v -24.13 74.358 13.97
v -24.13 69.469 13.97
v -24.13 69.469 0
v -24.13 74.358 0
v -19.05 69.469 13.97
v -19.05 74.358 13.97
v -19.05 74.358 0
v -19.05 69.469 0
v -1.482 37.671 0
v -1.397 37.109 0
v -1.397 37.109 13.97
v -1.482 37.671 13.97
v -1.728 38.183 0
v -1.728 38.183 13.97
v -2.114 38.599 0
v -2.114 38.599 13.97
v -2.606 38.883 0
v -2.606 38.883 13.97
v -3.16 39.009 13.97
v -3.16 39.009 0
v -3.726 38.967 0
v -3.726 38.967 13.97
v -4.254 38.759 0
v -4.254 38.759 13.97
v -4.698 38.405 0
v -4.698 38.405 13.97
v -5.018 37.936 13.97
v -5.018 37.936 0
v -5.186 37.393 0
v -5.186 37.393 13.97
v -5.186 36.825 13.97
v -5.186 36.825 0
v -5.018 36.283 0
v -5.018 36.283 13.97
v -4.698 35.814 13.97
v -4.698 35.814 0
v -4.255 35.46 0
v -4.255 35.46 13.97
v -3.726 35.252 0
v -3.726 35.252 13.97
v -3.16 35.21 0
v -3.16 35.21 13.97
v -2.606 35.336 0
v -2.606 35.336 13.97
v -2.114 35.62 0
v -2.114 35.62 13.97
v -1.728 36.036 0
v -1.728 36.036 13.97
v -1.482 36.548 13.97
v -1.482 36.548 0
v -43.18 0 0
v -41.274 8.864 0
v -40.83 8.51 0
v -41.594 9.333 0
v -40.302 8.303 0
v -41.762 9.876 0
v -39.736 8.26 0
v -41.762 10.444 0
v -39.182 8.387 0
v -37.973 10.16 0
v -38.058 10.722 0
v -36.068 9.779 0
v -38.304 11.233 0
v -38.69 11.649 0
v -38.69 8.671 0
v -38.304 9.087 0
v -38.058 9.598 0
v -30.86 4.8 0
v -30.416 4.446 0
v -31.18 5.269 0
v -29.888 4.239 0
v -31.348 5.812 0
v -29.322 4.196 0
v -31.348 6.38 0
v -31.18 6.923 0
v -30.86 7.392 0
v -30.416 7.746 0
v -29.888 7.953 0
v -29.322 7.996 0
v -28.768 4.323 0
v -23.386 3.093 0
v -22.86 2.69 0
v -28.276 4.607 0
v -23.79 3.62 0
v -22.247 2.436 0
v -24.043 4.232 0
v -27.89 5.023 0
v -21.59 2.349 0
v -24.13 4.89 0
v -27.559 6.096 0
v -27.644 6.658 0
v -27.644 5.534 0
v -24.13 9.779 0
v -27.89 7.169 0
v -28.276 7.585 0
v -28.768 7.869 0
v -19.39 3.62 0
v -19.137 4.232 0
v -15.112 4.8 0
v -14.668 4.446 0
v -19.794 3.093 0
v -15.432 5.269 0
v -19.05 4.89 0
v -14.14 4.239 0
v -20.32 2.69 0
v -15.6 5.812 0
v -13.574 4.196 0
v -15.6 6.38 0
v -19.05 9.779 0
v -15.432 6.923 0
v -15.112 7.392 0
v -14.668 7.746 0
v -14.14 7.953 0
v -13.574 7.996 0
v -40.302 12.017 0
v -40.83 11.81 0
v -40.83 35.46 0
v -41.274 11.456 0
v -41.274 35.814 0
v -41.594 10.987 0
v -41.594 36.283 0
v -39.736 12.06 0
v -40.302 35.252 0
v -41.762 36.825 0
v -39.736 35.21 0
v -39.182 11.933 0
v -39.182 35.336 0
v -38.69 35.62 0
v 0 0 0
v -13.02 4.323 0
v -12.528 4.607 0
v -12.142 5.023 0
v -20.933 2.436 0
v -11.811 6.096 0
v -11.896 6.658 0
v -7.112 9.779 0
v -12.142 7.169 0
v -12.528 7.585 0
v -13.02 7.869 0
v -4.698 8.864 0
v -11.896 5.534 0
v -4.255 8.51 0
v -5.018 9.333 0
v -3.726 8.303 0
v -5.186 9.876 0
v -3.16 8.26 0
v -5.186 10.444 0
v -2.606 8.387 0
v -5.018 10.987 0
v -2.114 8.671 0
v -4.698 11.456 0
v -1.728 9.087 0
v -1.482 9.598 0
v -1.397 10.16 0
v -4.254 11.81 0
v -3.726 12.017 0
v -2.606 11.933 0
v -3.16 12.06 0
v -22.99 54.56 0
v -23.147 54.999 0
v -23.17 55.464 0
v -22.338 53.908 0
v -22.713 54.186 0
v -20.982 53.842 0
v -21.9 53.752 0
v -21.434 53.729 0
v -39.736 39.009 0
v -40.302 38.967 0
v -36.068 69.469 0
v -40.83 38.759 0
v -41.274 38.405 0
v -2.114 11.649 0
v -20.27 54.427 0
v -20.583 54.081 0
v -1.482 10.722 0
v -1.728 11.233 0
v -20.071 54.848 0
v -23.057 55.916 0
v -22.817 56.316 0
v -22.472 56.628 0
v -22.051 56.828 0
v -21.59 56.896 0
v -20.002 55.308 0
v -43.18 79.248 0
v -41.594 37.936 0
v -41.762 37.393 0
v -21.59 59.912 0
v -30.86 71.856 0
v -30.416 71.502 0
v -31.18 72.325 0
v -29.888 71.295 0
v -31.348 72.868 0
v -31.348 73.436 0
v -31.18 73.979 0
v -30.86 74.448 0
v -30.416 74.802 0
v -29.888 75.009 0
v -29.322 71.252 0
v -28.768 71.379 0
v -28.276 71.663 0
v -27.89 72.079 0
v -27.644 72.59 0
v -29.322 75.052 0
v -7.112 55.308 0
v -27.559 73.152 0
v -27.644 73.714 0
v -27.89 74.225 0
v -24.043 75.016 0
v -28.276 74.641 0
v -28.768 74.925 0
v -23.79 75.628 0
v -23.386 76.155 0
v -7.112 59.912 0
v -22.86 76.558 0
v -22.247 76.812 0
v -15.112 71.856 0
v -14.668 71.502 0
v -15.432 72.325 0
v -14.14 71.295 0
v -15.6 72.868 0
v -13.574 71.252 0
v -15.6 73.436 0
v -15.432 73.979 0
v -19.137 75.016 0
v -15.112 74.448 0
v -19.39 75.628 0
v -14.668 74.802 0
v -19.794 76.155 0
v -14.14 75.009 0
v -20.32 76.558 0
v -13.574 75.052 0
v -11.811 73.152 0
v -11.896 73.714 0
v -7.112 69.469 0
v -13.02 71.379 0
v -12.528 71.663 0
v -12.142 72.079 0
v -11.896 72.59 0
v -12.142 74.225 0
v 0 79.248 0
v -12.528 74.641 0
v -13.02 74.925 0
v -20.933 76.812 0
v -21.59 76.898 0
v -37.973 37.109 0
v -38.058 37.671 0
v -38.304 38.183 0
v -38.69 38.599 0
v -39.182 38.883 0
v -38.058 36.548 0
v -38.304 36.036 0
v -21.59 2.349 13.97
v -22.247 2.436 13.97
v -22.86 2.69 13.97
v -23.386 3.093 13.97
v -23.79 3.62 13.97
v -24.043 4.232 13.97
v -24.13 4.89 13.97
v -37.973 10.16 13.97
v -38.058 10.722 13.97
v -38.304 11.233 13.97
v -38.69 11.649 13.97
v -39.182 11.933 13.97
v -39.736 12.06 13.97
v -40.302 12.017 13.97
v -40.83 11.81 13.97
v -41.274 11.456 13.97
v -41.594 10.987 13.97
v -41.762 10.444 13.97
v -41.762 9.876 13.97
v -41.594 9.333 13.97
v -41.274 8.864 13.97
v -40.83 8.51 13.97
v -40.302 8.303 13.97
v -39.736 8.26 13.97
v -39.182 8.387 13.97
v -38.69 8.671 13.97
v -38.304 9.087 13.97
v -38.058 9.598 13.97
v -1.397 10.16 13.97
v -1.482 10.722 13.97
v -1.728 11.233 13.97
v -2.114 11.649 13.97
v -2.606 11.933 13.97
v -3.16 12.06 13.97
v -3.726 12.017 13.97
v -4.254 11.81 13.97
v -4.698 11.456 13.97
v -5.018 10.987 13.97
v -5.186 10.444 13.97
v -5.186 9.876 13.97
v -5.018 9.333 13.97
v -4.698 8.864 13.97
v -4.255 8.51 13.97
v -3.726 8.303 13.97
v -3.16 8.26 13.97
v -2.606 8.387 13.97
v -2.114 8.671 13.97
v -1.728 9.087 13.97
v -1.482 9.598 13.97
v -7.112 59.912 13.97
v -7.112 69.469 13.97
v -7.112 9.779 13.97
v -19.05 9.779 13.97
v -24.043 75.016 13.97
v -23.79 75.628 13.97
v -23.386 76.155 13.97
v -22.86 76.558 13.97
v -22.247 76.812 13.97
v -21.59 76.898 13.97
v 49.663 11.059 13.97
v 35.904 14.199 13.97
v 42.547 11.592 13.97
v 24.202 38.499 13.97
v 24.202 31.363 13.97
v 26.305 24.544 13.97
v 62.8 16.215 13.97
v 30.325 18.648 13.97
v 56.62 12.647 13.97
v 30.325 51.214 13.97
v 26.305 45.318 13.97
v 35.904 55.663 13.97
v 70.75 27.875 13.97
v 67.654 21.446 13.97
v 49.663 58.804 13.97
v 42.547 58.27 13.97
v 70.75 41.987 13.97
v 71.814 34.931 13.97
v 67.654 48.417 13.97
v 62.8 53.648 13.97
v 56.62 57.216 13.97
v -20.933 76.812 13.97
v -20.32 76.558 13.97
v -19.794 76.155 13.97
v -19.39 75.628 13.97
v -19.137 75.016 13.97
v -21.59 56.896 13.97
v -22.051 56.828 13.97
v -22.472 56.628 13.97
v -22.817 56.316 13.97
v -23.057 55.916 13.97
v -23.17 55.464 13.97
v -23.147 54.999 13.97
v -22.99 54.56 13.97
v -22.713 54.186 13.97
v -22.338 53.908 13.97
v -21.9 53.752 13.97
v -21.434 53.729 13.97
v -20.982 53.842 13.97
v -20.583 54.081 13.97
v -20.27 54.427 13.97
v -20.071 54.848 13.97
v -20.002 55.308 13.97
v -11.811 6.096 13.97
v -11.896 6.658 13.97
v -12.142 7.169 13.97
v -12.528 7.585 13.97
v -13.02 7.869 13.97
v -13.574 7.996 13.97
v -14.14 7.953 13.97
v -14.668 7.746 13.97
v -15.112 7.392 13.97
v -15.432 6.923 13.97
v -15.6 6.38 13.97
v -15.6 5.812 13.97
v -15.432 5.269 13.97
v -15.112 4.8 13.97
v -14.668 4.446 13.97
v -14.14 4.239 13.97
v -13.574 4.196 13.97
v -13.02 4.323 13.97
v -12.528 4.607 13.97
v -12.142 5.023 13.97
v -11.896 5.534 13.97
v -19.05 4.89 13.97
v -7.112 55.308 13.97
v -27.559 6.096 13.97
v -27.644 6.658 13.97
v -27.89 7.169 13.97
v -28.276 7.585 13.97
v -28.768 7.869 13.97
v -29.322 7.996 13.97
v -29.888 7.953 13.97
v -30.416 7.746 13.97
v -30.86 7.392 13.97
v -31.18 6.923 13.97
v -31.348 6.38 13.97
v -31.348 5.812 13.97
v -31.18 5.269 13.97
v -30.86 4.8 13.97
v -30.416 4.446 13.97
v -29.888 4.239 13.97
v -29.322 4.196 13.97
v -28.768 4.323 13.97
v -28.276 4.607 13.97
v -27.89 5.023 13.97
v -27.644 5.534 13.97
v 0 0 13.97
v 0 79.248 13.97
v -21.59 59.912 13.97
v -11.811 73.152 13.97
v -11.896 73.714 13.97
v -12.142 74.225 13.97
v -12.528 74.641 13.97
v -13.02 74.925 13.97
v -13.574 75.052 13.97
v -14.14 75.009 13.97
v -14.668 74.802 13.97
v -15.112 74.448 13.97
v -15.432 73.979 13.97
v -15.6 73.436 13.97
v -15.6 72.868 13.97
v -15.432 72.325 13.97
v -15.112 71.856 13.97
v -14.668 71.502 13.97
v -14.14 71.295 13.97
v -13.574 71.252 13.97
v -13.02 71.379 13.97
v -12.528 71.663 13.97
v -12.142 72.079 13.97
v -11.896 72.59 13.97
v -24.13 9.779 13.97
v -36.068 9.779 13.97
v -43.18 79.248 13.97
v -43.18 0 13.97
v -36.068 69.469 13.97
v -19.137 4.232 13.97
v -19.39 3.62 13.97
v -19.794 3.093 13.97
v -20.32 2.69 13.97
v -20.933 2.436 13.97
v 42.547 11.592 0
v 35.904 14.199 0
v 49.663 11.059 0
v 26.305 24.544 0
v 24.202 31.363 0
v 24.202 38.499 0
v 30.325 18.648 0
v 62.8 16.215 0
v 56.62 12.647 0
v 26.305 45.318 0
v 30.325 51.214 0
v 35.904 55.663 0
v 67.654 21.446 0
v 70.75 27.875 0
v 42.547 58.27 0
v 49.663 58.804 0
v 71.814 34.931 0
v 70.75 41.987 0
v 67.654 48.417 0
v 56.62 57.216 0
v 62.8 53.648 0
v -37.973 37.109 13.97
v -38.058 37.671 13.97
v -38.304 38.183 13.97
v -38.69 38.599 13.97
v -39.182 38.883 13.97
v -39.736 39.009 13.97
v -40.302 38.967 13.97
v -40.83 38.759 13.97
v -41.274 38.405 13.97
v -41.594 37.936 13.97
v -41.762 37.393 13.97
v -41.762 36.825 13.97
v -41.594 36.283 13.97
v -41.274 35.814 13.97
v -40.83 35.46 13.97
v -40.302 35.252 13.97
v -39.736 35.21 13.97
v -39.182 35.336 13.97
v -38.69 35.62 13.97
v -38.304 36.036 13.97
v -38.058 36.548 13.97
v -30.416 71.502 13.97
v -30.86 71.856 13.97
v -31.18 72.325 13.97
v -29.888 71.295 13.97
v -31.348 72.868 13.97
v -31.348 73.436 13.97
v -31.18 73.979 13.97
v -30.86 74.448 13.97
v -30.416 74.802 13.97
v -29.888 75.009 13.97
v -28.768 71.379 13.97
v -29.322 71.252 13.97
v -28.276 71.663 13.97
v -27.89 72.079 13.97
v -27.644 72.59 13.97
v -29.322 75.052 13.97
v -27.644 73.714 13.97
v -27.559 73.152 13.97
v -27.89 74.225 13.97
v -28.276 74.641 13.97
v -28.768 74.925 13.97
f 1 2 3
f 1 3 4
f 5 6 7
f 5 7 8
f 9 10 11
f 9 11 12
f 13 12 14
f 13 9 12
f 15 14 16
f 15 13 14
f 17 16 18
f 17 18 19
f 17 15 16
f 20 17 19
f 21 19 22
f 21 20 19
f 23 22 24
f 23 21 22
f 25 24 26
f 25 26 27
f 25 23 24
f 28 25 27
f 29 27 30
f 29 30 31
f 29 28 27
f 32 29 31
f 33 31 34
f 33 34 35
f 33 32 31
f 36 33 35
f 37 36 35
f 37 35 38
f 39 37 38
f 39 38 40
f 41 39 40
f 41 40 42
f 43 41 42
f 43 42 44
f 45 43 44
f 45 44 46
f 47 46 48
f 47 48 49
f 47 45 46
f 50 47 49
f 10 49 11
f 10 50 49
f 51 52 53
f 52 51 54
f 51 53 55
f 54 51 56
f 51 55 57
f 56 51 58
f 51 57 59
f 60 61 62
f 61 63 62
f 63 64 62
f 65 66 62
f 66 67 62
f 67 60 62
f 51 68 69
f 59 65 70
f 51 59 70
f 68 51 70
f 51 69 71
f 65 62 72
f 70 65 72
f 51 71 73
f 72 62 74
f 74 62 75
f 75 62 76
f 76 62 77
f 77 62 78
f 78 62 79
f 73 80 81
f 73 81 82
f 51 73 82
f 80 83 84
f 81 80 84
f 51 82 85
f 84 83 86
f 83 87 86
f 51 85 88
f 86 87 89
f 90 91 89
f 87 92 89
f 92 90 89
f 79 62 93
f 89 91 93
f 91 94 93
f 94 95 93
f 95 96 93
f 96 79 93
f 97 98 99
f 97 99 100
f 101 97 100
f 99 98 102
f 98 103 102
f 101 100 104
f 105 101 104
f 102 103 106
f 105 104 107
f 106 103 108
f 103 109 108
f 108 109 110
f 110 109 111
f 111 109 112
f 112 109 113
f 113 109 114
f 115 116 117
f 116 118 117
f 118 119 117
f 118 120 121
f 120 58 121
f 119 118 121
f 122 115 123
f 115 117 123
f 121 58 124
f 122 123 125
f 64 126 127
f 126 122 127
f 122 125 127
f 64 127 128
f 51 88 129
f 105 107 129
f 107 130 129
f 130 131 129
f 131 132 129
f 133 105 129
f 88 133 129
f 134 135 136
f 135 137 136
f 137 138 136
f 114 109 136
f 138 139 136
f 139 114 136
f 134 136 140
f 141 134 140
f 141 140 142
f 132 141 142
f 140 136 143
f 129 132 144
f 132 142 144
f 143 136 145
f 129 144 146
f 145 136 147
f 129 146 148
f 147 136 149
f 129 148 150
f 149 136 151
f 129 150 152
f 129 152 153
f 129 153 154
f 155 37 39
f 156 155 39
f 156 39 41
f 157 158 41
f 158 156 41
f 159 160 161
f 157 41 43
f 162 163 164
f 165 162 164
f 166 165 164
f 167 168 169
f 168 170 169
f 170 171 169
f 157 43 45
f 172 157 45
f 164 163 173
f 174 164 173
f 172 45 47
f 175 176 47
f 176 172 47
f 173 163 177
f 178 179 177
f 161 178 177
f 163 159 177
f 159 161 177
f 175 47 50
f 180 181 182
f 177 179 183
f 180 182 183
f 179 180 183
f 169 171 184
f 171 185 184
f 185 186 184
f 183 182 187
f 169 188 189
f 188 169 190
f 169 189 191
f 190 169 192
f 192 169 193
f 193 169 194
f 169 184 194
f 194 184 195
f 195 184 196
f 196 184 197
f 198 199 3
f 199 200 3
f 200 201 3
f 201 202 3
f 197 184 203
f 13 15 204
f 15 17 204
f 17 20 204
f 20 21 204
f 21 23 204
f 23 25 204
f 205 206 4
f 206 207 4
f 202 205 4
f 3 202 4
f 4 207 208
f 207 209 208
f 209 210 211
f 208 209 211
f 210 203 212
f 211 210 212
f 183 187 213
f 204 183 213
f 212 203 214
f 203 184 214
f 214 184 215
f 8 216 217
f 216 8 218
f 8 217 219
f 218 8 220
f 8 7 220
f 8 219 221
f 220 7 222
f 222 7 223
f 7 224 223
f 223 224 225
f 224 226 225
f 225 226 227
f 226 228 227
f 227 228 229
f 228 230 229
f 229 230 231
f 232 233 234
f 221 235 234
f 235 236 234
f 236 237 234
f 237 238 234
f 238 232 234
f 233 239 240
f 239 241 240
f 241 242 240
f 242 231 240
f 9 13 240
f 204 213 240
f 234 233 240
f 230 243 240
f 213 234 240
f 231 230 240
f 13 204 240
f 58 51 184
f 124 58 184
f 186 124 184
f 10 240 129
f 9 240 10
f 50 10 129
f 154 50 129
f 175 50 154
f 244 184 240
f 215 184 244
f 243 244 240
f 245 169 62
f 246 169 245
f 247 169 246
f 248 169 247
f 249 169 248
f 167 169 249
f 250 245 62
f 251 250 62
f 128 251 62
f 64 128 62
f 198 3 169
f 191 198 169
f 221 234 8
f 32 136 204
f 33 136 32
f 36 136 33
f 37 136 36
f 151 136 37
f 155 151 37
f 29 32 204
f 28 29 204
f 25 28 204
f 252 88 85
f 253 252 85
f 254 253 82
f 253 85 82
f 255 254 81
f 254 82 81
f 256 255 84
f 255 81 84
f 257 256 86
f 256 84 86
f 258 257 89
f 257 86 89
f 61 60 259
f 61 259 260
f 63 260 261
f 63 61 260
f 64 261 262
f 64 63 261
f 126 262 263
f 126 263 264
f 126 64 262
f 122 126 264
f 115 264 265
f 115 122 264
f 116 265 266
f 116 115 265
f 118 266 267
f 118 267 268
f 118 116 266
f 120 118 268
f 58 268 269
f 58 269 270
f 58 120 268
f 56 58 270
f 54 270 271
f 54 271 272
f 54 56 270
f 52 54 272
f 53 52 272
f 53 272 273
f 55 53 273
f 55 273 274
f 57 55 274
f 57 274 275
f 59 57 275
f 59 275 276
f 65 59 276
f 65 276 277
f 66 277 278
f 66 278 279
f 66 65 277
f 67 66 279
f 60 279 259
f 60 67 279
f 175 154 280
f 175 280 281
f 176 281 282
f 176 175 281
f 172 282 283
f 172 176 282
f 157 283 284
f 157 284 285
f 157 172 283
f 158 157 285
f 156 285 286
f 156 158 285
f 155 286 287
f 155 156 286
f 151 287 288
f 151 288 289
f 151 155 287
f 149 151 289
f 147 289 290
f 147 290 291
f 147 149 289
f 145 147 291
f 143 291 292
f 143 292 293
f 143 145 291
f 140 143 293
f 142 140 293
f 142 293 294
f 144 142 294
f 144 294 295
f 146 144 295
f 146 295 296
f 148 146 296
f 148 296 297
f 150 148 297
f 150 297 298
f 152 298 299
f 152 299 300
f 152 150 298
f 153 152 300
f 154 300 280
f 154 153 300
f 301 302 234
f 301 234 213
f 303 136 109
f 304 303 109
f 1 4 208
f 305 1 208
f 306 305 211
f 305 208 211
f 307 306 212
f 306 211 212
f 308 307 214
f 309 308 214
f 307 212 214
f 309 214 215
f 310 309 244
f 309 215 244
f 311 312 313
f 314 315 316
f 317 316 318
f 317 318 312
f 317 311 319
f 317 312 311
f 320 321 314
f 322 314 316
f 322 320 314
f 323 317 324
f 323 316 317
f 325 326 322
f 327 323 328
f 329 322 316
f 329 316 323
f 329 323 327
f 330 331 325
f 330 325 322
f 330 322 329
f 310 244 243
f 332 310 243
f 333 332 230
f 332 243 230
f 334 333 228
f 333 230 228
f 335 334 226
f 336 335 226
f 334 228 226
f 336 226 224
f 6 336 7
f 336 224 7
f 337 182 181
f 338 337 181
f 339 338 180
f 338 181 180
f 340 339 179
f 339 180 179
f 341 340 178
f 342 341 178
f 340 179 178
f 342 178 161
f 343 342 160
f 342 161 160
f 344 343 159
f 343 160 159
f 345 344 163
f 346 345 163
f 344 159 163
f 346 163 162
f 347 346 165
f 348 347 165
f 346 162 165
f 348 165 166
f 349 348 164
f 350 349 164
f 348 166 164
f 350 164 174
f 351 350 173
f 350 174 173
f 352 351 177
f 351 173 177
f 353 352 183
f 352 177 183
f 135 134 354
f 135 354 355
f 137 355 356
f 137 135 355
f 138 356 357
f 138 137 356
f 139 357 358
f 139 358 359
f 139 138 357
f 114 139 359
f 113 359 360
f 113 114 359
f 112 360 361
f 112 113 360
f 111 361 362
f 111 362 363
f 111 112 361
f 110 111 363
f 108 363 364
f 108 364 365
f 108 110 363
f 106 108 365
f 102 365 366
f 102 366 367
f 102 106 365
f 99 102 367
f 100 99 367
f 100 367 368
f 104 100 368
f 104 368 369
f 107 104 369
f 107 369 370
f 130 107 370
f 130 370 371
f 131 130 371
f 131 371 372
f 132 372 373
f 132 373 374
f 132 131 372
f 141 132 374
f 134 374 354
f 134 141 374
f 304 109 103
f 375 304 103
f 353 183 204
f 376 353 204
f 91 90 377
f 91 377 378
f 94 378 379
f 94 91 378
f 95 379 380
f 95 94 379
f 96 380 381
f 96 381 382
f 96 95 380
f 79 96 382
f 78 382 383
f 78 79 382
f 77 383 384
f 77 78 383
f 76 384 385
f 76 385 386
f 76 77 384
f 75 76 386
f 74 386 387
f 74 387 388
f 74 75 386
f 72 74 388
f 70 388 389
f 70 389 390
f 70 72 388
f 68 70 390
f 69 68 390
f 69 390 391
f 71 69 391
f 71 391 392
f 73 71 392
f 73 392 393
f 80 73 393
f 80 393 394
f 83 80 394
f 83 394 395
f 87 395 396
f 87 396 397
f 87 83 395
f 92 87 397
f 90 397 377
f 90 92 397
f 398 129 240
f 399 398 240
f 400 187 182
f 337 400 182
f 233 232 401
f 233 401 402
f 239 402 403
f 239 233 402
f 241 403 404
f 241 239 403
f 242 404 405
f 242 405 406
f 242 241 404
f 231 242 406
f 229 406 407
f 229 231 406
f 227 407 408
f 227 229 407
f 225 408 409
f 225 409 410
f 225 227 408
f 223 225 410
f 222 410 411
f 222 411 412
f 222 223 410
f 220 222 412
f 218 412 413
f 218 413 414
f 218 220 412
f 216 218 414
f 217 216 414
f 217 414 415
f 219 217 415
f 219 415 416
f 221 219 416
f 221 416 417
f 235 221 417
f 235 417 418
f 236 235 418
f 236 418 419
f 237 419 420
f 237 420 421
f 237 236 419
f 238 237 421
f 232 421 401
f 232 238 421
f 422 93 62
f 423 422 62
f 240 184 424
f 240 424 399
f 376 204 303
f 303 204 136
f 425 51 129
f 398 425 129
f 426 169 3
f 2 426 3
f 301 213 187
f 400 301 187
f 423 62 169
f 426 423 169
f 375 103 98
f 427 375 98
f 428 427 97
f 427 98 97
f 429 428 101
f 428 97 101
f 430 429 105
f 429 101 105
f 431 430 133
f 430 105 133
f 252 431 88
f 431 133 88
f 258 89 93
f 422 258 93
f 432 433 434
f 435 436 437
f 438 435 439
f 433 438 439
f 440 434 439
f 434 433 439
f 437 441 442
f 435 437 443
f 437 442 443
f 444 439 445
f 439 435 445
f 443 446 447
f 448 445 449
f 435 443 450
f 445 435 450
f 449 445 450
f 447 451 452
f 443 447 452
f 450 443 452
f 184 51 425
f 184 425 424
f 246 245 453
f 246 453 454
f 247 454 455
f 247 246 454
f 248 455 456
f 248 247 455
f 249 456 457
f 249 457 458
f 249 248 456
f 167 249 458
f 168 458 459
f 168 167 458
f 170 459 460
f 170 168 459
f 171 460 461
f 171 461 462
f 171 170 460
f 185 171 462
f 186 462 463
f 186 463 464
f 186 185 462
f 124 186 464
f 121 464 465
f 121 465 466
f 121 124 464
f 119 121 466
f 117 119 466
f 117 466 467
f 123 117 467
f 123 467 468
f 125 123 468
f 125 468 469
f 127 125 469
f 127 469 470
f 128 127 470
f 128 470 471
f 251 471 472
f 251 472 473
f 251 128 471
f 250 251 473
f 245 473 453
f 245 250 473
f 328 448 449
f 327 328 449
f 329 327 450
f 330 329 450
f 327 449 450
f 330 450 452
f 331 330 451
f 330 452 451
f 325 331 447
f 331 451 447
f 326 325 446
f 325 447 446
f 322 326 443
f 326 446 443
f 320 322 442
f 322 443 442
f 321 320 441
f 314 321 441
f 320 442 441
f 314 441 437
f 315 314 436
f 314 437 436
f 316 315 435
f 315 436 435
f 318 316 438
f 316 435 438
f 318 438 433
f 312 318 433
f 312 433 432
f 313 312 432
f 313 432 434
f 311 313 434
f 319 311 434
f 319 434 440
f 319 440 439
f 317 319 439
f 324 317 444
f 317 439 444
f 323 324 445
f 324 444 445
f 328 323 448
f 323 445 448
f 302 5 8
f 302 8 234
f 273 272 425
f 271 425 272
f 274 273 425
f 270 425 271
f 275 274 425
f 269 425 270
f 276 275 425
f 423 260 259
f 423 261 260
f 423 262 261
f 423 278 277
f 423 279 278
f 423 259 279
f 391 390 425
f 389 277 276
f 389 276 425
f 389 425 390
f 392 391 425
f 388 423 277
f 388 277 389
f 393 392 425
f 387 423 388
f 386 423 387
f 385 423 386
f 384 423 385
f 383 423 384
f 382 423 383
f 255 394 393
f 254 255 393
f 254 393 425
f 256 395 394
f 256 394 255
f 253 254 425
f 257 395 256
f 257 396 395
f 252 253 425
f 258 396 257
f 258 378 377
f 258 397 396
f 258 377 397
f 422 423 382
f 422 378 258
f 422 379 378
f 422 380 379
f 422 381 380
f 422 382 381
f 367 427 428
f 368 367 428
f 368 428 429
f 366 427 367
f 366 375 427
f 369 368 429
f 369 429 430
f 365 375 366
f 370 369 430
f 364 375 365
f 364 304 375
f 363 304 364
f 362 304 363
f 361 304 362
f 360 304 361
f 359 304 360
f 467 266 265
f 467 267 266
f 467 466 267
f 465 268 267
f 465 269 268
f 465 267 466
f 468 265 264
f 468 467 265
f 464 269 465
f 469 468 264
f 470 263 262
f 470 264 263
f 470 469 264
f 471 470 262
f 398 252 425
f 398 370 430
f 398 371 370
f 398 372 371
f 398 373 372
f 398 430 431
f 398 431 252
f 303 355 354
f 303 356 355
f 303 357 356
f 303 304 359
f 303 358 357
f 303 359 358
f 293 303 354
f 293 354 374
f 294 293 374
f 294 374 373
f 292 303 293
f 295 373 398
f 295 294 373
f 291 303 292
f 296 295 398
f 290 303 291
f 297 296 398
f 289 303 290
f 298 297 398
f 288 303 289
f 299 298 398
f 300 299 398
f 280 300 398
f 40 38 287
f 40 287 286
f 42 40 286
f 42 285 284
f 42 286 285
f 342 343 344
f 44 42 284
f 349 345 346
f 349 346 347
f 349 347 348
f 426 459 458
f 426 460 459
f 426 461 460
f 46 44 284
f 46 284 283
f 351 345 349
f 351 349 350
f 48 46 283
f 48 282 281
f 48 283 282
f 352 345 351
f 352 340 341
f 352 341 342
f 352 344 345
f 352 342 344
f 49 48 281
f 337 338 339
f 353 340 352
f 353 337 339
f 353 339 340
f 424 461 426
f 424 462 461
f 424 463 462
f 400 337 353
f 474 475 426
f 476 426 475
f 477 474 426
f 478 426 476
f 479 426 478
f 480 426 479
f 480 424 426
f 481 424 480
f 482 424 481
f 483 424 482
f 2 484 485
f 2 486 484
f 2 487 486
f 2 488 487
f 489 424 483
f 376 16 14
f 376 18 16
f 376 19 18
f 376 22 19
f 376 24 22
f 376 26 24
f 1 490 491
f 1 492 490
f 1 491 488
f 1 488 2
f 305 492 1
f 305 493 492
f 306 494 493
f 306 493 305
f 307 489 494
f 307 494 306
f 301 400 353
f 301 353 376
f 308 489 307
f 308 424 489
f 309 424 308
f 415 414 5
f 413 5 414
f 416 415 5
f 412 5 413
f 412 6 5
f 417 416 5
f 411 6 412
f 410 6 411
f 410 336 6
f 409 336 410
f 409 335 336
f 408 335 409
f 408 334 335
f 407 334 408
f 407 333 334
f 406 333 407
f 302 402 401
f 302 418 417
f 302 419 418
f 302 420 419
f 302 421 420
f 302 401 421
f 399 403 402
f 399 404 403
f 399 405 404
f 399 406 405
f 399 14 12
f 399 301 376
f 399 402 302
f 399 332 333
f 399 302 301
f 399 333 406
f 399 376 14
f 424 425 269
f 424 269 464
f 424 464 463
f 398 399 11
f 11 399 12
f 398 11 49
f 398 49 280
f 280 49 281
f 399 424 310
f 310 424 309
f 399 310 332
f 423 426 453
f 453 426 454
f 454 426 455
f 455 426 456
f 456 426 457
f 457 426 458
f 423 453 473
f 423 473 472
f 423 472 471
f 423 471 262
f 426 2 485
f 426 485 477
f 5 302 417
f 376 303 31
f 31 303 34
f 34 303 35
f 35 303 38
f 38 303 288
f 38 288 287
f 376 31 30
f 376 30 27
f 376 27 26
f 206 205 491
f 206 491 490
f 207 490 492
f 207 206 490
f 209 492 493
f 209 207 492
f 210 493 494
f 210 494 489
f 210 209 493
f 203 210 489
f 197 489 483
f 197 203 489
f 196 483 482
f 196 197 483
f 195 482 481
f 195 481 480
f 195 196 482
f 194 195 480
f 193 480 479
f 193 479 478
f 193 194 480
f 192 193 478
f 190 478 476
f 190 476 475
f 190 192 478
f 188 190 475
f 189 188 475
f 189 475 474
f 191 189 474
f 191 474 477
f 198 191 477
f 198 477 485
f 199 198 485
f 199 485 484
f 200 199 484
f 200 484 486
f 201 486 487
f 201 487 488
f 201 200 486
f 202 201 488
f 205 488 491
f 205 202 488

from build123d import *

# Parameters (mm, degrees)
F0_W     = 43.18
F0_H     = 79.248
F0_R     = 1.905
F1_DEPTH = 13.97
F2_R     = 23.9395
F3_DEPTH = 13.97


with BuildPart() as f1:
    # F0 (on Top) → F1 (new body)
    with BuildSketch(Plane.XY):
        with Locations((-21.59, 39.624)):
            Rectangle(F0_W, F0_H)
        with Locations((-39.878, 10.16)):
            Circle(F0_R, mode=Mode.SUBTRACT)
        with Locations((-29.464, 6.096)):
            Circle(F0_R, mode=Mode.SUBTRACT)
        with Locations((-39.878, 37.1094)):
            Circle(F0_R, mode=Mode.SUBTRACT)
        with Locations((-13.716, 6.096)):
            Circle(F0_R, mode=Mode.SUBTRACT)
        with Locations((-3.302, 10.16)):
            Circle(F0_R, mode=Mode.SUBTRACT)
        with BuildLine():
            Line((-36.068, 69.469), (-24.13, 69.469))
            Line((-24.13, 69.469), (-24.13, 74.3585))
            ThreePointArc((-24.13, 74.3585), (-23.386051, 76.154551), (-21.59, 76.8985))
            ThreePointArc((-21.59, 76.8985), (-19.793949, 76.154551), (-19.05, 74.3585))
            Line((-19.05, 74.3585), (-19.05, 69.469))
            Line((-19.05, 69.469), (-7.112, 69.469))
            Line((-7.112, 69.469), (-7.112, 59.912313))
            Line((-7.112, 59.912313), (-7.112, 55.3085))
            Line((-7.112, 55.3085), (-7.112, 9.779))
            Line((-7.112, 9.779), (-19.05, 9.779))
            Line((-19.05, 9.779), (-19.05, 4.8895))
            ThreePointArc((-19.05, 4.8895), (-19.793949, 3.093449), (-21.59, 2.3495))
            ThreePointArc((-21.59, 2.3495), (-23.386051, 3.093449), (-24.13, 4.8895))
            Line((-24.13, 4.8895), (-24.13, 9.779))
            Line((-24.13, 9.779), (-36.068, 9.779))
            Line((-36.068, 9.779), (-36.068, 69.469))
        make_face(mode=Mode.SUBTRACT)
        with Locations((-3.302, 37.1094)):
            Circle(F0_R, mode=Mode.SUBTRACT)
        with Locations((-29.464, 73.152)):
            Circle(F0_R, mode=Mode.SUBTRACT)
        with Locations((-13.716, 73.152)):
            Circle(F0_R, mode=Mode.SUBTRACT)
        with BuildLine():
            Line((-7.112, 55.3085), (-7.112, 59.912313))
            Line((-7.112, 59.912313), (-21.59, 59.912313))
            Line((-21.59, 59.912313), (-21.59, 56.896))
            ThreePointArc((-21.59, 56.896), (-20.467468, 56.431032), (-20.0025, 55.3085))
            Line((-20.0025, 55.3085), (-7.112, 55.3085))
        make_face()
        with BuildLine():
            ThreePointArc((-21.59, 56.896), (-22.712532, 54.185968), (-20.0025, 55.3085))
            Line((-20.0025, 55.3085), (-21.59, 55.3085))
            Line((-21.59, 55.3085), (-21.59, 56.896))
        make_face()
        with BuildLine():
            Line((-21.59, 55.3085), (-20.0025, 55.3085))
            ThreePointArc((-20.0025, 55.3085), (-20.467468, 56.431032), (-21.59, 56.896))
            Line((-21.59, 56.896), (-21.59, 55.3085))
        make_face()
    extrude(amount=F1_DEPTH)


with BuildPart() as f3:
    # F2 (on Top) → F3 (new body)
    with BuildSketch(Plane.XY):
        with Locations((47.874164, 34.931198)):
            Circle(F2_R)
    extrude(amount=F3_DEPTH)


solid = Compound([f1.part, f3.part])
